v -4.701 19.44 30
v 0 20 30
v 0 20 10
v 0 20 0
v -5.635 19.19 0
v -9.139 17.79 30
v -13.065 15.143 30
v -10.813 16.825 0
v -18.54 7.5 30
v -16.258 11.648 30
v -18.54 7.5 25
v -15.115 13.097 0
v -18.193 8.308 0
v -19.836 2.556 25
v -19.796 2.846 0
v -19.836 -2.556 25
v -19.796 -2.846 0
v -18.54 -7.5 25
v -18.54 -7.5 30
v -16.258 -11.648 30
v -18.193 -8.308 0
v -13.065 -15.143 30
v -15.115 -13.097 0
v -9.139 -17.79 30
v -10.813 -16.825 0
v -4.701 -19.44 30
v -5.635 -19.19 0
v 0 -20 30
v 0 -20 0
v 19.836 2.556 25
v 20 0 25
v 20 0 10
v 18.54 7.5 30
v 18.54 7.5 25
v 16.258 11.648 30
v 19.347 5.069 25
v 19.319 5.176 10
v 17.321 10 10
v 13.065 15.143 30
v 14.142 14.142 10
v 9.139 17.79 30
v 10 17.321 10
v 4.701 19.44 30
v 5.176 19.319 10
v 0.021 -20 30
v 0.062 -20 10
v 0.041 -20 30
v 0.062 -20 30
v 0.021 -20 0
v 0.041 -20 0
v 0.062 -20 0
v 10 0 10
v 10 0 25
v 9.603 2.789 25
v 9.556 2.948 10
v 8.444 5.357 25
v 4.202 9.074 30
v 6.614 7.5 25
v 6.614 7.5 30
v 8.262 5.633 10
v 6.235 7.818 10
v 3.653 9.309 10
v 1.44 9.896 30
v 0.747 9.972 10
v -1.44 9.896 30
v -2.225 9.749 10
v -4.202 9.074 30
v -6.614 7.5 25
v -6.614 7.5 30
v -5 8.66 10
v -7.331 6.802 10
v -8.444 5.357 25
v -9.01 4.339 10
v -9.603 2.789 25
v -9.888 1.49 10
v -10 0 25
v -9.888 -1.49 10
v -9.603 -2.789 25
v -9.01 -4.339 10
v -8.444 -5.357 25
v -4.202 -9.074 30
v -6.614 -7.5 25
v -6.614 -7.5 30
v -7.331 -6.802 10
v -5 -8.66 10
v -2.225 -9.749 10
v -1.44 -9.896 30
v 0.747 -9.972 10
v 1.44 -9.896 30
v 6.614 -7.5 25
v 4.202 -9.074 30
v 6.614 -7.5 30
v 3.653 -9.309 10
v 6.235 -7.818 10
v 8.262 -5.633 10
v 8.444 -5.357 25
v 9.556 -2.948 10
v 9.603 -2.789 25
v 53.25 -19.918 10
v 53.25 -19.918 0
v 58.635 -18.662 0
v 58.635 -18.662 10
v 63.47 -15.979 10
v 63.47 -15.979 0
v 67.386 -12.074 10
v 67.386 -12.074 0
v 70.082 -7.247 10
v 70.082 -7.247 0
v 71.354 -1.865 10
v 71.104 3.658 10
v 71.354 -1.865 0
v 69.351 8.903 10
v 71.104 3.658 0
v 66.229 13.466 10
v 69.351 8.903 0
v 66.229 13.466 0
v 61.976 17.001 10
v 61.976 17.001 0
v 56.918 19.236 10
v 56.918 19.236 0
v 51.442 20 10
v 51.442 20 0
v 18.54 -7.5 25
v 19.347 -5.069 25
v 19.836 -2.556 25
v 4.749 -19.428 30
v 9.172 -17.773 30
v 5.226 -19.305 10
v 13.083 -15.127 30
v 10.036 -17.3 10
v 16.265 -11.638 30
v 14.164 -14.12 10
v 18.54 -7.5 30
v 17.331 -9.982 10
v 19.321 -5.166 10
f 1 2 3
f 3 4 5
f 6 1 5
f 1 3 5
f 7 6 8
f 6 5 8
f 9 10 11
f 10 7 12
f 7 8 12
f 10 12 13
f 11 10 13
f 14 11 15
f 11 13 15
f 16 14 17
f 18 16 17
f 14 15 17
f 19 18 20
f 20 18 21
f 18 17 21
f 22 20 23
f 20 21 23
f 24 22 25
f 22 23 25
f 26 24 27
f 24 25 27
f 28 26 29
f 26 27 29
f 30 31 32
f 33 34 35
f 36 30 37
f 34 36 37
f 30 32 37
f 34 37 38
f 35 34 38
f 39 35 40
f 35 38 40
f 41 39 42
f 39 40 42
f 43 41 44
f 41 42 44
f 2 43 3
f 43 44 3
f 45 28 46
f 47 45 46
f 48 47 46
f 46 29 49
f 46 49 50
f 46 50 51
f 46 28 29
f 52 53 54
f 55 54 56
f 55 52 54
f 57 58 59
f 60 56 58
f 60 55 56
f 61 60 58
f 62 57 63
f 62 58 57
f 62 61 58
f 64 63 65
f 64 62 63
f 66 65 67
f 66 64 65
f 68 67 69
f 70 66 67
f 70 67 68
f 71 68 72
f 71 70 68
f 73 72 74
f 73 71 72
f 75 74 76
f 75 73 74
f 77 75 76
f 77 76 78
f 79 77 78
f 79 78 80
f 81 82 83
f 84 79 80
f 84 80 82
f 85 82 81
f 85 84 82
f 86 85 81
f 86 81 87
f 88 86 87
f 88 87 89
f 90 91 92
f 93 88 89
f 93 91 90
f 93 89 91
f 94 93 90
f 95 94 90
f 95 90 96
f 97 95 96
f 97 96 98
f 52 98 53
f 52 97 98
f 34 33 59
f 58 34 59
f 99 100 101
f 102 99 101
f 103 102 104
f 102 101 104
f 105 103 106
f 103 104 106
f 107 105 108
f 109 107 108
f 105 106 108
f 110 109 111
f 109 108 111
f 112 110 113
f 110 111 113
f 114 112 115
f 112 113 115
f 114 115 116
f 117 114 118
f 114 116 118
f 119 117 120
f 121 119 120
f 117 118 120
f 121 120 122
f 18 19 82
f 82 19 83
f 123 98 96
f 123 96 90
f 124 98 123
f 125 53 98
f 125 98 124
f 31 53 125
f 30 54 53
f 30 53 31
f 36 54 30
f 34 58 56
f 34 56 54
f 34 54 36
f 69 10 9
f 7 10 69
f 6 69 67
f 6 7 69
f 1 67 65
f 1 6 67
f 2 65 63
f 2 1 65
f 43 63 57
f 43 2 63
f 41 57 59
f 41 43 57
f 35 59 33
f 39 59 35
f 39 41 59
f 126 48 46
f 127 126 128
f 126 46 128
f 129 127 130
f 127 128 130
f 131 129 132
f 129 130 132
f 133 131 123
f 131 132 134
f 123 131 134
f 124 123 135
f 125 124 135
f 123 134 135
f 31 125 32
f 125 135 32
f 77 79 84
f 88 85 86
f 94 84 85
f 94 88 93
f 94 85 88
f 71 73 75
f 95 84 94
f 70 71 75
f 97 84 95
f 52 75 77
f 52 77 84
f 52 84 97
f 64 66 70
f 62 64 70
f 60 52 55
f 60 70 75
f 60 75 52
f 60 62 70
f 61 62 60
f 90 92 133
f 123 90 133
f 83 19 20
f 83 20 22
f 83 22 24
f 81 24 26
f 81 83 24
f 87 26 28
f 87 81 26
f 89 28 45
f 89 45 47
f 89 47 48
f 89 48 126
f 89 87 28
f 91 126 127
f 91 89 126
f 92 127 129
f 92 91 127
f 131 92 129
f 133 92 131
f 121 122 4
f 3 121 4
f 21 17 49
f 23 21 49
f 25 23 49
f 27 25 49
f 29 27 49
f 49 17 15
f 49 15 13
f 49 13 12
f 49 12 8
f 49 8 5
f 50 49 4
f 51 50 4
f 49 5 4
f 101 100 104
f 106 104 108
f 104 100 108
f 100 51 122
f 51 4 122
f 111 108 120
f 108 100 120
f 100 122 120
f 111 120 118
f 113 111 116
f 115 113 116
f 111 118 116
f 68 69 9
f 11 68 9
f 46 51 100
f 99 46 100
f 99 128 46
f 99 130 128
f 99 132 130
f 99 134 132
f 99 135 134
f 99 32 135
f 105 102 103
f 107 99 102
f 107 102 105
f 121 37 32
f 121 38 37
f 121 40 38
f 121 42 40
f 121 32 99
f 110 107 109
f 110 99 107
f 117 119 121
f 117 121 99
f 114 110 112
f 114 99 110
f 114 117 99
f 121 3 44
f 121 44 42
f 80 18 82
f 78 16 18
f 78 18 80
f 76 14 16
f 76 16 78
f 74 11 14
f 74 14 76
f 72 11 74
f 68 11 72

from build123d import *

# Parameters (mm, degrees)
F1_DEPTH = 10
F2_R     = 10
F3_DEPTH = 20
F5_DEPTH = 5


with BuildPart() as f1:
    # F0 (on Top) → F1 (new body)
    with BuildSketch(Plane.XY):
        with BuildLine():
            Line((51.441539079, 20), (0, 20))
            ThreePointArc((0, 20), (-20, 0), (0, -20))
            ThreePointArc((0, -20), (0.030776405, -19.9999763203), (0.061552737, -19.9999052813))
            Line((0.061552737, -19.9999052813), (49.6942619614, -19.9235293729))
            Line((49.6942619614, -19.9235293729), (53.2501253097, -19.9180575319))
            ThreePointArc((53.2501253097, -19.9180575319), (71.4210429597, 0.905220791), (51.441539079, 20))
        make_face()
    extrude(amount=F1_DEPTH)

    # F2 (on face) → F3 (join)
    with BuildSketch(Plane.XY.offset(10)):
        with BuildLine():
            ThreePointArc((0.061552737, -19.9999052813), (14.1638810843, -14.120356675), (20, 0))
            ThreePointArc((20, 0), (14.1421356237, 14.1421356237), (0, 20))
            ThreePointArc((0, 20), (-20, 0), (0, -20))
            ThreePointArc((0, -20), (0.030776405, -19.9999763203), (0.061552737, -19.9999052813))
        make_face()
        Circle(F2_R, mode=Mode.SUBTRACT)
    extrude(amount=F3_DEPTH)

    # F4 (on face) → F5 (cut)
    with BuildSketch(Plane.XY.offset(30)):
        with BuildLine():
            Line((-6.6143782777, 7.5), (-18.5404962177, 7.5))
            ThreePointArc((-18.5404962177, 7.5), (-20, 0), (-18.5404962177, -7.5))
            Line((-18.5404962177, -7.5), (-6.6143782777, -7.5))
            ThreePointArc((-6.6143782777, -7.5), (-10, 0), (-6.6143782777, 7.5))
        make_face()
        with BuildLine():
            ThreePointArc((20, 0), (19.63173355, 3.8203452491), (18.5404962177, 7.5))
            Line((18.5404962177, 7.5), (6.6143782777, 7.5))
            ThreePointArc((6.6143782777, 7.5), (9.1143782777, 4.1143782777), (10, 0))
            ThreePointArc((10, 0), (9.1143782777, -4.1143782777), (6.6143782777, -7.5))
            Line((6.6143782777, -7.5), (18.5404962177, -7.5))
            ThreePointArc((18.5404962177, -7.5), (19.63173355, -3.8203452491), (20, 0))
        make_face()
    extrude(amount=-F5_DEPTH, mode=Mode.SUBTRACT)


solid = f1.part
